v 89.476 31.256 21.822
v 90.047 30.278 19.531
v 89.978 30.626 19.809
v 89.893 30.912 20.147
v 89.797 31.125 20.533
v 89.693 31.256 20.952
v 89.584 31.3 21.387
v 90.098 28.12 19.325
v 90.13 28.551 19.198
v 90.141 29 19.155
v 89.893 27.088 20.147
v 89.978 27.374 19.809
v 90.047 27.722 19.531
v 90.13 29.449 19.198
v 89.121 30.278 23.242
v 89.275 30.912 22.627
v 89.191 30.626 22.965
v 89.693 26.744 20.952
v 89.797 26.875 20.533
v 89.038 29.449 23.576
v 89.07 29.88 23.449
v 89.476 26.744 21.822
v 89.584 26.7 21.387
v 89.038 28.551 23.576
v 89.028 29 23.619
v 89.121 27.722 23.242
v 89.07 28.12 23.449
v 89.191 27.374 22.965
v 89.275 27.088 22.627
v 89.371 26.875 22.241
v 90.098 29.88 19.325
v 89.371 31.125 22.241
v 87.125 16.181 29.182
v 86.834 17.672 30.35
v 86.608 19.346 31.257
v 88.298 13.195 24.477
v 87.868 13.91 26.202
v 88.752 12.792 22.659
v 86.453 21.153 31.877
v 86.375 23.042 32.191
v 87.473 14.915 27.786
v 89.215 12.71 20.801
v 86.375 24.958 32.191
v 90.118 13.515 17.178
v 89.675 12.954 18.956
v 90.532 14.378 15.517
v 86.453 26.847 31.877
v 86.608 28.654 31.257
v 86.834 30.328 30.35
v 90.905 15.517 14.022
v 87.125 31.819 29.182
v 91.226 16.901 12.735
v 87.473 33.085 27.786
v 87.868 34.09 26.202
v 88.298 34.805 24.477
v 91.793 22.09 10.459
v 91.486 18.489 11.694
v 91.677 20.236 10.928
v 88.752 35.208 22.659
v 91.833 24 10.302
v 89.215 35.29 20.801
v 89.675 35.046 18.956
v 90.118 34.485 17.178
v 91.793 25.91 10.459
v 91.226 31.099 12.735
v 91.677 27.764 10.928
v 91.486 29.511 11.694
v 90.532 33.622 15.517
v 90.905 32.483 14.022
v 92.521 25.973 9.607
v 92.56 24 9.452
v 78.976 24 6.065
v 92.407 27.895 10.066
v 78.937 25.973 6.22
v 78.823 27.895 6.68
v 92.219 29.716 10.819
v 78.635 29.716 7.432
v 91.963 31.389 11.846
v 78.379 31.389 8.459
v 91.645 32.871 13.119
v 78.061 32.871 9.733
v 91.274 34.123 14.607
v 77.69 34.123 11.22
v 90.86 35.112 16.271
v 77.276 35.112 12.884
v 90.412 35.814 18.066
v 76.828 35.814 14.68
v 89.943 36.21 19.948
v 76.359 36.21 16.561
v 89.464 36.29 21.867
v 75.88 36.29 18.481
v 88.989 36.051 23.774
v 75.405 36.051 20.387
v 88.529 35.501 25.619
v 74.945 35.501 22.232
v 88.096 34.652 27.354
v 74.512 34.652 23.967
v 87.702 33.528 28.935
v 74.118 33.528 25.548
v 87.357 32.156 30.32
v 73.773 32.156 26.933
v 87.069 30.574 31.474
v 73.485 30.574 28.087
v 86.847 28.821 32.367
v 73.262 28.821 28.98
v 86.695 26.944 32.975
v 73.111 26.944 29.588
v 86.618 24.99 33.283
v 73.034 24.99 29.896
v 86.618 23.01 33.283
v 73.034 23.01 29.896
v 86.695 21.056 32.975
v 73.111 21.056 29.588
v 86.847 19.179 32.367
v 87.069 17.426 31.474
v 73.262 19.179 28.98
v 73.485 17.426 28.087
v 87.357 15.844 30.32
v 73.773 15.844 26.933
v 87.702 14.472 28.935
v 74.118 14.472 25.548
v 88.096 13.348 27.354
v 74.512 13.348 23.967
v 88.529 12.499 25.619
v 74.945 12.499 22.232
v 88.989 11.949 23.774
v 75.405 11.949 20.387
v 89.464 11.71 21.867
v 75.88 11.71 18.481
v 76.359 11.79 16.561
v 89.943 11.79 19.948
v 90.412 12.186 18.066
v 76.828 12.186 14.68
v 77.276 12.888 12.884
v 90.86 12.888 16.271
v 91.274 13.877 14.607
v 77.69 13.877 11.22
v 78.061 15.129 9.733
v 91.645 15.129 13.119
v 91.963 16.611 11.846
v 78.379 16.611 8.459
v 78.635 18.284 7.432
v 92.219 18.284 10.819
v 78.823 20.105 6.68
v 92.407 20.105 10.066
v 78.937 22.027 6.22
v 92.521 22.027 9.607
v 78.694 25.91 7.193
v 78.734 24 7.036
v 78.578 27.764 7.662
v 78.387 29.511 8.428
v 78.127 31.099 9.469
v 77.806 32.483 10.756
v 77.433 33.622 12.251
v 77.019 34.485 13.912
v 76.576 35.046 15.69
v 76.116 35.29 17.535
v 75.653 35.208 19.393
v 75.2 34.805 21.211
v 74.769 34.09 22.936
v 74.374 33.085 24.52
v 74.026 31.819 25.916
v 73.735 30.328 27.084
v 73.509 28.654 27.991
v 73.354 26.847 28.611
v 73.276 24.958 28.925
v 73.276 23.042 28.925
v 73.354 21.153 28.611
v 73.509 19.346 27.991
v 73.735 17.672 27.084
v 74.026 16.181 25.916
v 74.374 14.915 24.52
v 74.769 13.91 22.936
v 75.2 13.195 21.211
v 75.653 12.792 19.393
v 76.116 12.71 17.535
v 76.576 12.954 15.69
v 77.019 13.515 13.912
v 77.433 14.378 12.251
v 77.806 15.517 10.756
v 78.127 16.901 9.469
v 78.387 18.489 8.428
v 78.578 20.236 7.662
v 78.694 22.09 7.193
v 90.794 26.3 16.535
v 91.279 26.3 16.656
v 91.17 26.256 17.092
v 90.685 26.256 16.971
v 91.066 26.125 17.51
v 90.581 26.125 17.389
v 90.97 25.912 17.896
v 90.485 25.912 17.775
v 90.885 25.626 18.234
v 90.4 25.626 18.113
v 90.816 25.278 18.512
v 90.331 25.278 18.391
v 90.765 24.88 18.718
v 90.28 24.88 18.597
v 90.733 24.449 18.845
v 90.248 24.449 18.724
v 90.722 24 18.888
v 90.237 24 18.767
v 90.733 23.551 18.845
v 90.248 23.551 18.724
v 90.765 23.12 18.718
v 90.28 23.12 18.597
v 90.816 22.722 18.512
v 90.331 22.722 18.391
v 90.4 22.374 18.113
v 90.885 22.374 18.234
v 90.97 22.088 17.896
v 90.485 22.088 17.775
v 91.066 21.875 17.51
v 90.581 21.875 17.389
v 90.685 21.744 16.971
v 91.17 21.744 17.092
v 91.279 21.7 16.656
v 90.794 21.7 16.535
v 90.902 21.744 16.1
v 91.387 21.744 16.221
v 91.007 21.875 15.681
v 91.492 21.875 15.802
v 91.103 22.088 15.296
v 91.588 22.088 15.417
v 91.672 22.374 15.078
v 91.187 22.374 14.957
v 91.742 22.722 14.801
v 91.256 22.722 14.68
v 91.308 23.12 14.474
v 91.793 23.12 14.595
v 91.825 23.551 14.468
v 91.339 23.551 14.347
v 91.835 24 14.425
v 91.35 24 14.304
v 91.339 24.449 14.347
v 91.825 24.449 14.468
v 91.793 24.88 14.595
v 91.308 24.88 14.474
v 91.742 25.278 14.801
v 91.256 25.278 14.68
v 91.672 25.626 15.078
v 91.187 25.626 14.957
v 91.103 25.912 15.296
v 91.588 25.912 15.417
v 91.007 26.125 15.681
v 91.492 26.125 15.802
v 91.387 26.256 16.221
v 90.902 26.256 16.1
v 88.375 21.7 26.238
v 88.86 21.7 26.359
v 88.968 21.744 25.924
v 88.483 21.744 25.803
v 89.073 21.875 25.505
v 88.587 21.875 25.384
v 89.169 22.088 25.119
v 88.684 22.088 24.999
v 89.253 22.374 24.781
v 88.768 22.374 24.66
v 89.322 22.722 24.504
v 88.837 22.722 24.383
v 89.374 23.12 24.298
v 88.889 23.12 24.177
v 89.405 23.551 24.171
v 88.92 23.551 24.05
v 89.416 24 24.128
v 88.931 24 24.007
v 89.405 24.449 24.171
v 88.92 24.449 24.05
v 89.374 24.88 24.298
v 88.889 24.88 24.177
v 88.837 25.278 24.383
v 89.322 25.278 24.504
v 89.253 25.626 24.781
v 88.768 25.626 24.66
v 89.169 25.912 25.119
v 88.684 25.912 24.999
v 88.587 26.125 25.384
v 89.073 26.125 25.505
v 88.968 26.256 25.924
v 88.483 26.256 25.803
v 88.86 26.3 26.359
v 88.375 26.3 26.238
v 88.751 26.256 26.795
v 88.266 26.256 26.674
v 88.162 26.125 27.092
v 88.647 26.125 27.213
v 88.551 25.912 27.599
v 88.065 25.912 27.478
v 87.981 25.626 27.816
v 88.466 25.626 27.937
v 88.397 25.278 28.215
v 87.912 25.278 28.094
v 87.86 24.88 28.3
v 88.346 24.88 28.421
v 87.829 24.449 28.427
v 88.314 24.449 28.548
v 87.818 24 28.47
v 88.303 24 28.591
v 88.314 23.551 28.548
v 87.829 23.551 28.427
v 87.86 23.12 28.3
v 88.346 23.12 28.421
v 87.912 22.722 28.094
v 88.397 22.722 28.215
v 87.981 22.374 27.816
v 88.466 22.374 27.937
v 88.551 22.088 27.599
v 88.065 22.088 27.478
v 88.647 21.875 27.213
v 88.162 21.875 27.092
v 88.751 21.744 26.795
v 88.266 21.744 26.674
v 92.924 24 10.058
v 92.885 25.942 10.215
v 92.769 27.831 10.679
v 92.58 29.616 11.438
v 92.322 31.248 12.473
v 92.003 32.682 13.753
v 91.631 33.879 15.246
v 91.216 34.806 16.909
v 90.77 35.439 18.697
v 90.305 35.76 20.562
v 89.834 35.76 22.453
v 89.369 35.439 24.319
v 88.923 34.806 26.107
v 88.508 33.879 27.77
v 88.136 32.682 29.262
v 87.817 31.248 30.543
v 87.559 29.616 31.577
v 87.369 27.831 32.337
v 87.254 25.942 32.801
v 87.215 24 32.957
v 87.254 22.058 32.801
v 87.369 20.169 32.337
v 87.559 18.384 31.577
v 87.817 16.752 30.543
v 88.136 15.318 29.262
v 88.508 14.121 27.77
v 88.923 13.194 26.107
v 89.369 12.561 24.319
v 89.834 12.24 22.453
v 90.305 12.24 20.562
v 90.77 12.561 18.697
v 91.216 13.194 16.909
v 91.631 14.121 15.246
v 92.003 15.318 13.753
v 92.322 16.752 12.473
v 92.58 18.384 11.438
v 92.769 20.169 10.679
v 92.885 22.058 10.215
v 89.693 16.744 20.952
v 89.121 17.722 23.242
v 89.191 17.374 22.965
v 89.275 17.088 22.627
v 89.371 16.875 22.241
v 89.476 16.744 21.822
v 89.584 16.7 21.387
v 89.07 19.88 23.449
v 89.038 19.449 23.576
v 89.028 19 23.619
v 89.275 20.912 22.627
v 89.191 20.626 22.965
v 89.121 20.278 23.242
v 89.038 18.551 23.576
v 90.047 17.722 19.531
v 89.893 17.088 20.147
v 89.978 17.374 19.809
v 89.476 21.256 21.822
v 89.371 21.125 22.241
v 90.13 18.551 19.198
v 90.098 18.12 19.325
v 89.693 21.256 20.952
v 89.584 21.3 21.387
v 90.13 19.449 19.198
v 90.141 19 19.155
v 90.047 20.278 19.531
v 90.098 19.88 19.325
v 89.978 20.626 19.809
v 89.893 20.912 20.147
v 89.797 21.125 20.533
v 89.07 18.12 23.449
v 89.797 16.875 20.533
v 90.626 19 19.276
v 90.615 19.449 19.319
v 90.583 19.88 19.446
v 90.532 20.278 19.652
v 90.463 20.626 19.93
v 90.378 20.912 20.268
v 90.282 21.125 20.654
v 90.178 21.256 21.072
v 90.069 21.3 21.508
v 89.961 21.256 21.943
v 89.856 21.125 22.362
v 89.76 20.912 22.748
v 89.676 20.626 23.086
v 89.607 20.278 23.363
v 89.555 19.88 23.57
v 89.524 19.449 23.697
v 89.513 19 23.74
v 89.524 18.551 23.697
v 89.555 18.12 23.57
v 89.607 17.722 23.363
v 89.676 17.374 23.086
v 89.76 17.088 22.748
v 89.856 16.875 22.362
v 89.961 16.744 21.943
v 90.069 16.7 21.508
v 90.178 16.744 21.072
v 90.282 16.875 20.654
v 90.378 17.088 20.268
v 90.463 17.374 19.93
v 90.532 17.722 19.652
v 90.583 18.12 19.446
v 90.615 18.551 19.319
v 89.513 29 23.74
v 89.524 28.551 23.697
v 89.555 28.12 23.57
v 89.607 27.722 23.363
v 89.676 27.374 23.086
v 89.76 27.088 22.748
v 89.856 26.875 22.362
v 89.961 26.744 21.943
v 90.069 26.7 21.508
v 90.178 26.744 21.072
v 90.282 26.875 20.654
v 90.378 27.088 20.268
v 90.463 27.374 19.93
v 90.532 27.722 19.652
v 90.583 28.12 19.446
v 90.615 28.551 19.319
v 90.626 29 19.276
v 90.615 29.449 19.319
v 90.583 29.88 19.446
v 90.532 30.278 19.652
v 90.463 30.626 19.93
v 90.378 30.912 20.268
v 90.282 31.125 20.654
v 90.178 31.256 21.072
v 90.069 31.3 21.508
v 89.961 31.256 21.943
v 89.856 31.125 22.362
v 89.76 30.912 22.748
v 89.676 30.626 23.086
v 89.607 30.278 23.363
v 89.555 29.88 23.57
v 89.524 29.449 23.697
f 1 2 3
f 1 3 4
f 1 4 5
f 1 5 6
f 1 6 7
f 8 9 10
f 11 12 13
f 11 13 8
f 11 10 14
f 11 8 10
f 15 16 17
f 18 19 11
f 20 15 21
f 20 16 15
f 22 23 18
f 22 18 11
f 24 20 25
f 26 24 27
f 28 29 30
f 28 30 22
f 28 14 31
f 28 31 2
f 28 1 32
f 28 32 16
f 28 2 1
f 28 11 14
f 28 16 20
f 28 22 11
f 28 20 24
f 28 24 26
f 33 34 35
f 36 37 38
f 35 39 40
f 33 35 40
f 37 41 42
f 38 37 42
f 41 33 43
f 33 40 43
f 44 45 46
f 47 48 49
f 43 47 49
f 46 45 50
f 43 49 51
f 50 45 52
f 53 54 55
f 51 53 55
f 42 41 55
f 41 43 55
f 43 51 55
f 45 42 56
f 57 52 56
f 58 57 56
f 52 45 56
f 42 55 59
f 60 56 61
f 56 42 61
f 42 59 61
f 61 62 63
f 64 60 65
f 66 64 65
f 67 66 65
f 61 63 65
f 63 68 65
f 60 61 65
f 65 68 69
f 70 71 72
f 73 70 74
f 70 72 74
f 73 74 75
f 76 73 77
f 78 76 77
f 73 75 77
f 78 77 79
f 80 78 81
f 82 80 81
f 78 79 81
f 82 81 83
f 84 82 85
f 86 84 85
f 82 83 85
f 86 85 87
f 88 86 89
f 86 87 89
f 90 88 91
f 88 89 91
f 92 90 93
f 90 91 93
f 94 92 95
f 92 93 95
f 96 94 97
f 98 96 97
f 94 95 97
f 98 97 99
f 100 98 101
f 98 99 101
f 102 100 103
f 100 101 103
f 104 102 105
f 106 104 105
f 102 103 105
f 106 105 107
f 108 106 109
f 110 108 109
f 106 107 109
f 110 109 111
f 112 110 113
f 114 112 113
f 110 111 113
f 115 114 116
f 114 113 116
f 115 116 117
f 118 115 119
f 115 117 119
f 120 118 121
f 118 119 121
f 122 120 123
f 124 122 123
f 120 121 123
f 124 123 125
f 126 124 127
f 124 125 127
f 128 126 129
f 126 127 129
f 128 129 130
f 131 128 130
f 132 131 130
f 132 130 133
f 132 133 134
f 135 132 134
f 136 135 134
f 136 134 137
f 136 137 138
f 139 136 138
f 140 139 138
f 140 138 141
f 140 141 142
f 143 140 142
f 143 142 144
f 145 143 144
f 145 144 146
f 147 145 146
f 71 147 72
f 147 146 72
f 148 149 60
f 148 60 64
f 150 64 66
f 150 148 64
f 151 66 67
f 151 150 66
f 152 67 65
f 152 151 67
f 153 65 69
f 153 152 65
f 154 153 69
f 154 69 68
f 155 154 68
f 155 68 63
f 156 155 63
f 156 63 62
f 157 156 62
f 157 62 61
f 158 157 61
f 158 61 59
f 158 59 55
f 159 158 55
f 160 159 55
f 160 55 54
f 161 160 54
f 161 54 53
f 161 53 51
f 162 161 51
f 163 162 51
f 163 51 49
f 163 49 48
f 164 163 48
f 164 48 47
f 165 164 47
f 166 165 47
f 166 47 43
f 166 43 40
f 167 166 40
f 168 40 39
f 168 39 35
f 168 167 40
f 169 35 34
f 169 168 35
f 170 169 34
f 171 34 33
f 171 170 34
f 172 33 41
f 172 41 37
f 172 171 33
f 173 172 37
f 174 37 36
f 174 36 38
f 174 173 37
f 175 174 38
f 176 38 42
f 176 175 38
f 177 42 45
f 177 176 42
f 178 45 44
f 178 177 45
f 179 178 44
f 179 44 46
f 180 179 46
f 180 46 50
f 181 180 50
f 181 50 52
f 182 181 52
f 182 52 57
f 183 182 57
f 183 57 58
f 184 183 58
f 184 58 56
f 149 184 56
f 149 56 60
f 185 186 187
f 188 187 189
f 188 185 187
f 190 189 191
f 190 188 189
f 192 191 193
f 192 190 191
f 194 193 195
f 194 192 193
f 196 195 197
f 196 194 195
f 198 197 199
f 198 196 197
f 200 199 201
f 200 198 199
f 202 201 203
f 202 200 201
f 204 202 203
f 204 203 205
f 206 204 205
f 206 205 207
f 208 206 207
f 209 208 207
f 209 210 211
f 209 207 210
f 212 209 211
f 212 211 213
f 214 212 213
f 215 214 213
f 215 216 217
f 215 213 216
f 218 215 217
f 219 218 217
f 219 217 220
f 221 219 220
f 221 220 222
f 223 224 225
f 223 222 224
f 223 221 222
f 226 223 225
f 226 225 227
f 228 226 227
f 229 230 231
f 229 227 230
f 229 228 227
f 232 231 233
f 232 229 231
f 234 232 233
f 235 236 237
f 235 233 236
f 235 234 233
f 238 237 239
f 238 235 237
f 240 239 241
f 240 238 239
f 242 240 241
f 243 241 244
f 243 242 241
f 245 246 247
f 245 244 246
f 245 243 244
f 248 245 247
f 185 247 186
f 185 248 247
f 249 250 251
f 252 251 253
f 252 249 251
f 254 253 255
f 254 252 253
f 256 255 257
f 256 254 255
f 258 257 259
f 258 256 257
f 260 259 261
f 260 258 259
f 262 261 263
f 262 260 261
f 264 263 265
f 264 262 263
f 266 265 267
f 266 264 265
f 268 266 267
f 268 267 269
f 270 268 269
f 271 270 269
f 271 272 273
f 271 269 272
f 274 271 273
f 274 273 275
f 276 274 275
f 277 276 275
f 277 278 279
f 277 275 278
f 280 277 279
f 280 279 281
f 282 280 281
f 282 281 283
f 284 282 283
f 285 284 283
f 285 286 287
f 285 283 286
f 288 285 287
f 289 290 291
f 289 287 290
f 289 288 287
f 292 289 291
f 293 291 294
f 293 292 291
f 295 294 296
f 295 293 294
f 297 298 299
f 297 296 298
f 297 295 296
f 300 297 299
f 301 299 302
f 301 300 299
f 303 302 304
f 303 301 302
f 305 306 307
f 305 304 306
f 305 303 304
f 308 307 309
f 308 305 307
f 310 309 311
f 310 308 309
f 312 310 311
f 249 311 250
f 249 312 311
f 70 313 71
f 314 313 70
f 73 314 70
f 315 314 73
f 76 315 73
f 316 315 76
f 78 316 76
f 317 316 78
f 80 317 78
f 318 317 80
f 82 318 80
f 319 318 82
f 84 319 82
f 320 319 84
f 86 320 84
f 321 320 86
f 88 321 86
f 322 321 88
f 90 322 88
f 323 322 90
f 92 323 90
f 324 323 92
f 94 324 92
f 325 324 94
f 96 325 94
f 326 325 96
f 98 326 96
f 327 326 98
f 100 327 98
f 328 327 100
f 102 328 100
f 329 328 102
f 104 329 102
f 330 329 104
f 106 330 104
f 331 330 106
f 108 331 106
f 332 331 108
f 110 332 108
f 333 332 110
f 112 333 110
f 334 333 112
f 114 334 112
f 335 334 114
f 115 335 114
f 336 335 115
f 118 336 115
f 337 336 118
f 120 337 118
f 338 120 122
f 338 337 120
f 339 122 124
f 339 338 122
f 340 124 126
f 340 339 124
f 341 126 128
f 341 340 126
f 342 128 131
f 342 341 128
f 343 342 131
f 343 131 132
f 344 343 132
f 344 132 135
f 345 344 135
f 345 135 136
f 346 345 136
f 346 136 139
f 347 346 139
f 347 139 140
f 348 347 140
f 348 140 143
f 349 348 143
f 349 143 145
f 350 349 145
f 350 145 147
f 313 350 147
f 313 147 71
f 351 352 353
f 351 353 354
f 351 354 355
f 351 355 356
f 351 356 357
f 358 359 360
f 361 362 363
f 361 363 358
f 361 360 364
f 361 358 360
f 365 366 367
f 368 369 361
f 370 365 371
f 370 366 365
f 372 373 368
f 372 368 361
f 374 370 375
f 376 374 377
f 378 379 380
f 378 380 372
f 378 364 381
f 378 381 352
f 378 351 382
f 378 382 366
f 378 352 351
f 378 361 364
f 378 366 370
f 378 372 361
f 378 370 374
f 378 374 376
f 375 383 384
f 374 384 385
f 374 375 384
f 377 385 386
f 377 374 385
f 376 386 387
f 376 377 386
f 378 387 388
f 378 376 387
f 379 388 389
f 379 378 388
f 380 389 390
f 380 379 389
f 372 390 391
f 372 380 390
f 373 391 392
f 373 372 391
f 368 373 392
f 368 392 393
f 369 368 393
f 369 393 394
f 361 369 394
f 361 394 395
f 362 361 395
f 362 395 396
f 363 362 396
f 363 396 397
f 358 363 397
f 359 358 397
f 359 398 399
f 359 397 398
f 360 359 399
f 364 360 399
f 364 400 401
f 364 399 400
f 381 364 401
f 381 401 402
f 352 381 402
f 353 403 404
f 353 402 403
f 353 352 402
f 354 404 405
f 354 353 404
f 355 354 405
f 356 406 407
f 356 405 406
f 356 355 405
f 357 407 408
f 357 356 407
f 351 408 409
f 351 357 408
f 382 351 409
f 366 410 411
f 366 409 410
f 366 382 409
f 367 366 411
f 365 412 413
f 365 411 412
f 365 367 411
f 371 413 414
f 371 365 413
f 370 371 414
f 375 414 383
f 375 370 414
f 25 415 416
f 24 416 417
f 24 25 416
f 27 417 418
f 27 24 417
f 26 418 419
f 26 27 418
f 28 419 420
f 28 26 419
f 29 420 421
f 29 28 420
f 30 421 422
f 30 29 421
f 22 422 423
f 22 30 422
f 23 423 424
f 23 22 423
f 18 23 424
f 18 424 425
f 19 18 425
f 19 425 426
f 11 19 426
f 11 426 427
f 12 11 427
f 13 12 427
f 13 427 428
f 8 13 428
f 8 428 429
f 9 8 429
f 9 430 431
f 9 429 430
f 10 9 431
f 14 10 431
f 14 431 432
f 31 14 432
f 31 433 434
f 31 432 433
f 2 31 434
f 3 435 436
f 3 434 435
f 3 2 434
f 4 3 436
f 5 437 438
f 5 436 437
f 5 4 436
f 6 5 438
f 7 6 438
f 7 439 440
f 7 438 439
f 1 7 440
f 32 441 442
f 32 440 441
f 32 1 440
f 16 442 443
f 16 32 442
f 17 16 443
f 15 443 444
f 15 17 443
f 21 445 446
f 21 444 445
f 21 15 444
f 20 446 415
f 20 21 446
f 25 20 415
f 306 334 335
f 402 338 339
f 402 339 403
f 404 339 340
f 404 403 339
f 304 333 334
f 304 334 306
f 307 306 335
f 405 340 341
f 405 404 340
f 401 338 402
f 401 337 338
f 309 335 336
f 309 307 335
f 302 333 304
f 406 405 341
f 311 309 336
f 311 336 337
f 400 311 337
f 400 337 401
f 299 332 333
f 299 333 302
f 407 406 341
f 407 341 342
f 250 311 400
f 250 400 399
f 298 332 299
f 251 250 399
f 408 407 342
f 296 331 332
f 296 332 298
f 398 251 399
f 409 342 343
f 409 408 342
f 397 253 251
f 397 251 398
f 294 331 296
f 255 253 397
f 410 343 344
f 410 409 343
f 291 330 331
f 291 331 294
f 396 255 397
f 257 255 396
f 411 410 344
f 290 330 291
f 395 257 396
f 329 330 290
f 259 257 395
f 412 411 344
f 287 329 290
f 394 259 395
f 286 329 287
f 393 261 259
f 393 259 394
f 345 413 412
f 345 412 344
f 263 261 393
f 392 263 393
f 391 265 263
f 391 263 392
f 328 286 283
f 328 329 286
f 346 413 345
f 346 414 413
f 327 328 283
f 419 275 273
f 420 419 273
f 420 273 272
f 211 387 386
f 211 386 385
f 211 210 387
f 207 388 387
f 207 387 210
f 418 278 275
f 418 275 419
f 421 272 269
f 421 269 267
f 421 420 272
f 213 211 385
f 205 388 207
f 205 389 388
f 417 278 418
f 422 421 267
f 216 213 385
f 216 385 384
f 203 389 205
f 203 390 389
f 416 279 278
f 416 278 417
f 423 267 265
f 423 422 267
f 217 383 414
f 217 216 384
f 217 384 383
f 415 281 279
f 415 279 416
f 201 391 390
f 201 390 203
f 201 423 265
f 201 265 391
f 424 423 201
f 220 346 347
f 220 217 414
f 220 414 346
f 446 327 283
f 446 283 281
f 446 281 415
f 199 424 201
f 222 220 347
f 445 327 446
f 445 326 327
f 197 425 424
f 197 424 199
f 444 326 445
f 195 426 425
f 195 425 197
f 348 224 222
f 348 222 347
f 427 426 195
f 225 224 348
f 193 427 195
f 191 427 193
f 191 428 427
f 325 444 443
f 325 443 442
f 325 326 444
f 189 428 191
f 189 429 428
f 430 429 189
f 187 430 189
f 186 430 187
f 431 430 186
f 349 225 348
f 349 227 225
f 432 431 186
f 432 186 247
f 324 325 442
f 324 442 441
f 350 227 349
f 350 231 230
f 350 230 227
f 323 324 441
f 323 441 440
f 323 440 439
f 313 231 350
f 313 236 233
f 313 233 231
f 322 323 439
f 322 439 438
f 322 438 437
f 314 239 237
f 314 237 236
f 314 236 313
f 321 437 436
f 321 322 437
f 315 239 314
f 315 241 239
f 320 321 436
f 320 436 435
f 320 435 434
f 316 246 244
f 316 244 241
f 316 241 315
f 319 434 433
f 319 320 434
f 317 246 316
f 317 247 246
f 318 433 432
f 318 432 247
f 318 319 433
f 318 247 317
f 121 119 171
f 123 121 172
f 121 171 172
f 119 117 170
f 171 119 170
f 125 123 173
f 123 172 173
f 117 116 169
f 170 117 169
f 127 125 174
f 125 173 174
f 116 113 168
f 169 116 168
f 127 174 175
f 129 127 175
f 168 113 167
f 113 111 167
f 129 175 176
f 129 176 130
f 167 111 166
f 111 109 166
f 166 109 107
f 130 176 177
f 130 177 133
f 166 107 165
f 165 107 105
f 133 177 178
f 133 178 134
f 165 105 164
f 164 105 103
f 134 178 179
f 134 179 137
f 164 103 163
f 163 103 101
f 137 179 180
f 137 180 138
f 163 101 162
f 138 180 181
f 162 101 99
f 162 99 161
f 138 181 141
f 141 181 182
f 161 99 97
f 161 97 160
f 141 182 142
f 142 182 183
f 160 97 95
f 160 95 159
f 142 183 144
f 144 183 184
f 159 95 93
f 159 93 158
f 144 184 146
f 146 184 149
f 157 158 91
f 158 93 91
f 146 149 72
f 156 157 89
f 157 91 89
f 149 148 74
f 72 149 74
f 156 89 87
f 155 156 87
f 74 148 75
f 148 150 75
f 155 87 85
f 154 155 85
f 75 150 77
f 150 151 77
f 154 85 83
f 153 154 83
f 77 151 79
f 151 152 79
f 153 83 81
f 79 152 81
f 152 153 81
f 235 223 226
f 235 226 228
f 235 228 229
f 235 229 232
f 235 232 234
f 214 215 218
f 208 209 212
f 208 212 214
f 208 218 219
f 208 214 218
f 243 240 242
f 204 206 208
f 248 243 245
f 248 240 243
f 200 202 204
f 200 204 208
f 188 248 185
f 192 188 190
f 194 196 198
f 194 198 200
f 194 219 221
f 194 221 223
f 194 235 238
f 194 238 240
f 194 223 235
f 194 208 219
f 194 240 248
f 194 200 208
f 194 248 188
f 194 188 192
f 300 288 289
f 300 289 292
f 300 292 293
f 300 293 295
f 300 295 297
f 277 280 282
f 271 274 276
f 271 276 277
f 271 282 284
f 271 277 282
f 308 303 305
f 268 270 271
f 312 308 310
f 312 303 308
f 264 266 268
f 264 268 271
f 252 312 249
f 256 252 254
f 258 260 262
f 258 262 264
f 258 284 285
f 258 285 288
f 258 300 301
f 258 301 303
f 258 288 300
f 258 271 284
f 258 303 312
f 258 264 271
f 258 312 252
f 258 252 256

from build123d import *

# Parameters (mm, degrees)
CYLINDER005_R            = 11.3
CYLINDER005_DEPTH        = 14.5
CYLINDER004_R            = 2.3
CYLINDER004_DEPTH        = 14.5
ARRAY_COUNT              = 4
CYLINDER003_R            = 8.3
CYLINDER003_DEPTH        = 14.5
CYLINDER002_R            = 12.3
CYLINDER002_DEPTH        = 14.5
CHAMFER_SIZE             = 0.5
CLONE001_PLACEMENT_ANGLE = 76


with BuildPart() as cylinder005:
    # Cylinder005 → Cylinder005 (new body)
    with BuildSketch(Plane.XY.offset(-1)):
        Circle(CYLINDER005_R)
    extrude(amount=CYLINDER005_DEPTH)


with BuildPart() as array:
    # Cylinder004 → Cylinder004 (new body)
    with BuildSketch(Plane(origin=(0, -5, 14), x_dir=(1, 0, 0), z_dir=(0, 0, 1))):
        Circle(CYLINDER004_R)
    extrude(amount=CYLINDER004_DEPTH)

    # Array: Array ×4 about axis
    array_axis = Axis((0, 0, 0), (0, 0, 1))


with BuildPart() as array_1:
    add(array.part)
    for i in range(1, ARRAY_COUNT):
        add(array.part.rotate(array_axis, i * 360 / ARRAY_COUNT))


with BuildPart() as cylinder003:
    # Cylinder003 → Cylinder003 (new body)
    with BuildSketch(Plane.XY.offset(14.5)):
        Circle(CYLINDER003_R)
    extrude(amount=CYLINDER003_DEPTH)


with BuildPart() as cup_compound_clone:
    # Cylinder002 → Cylinder002 (new body)
    with BuildSketch(Plane.XY):
        Circle(CYLINDER002_R)
    extrude(amount=CYLINDER002_DEPTH)

    # Cut002: cut Cylinder003
    add(cylinder003.part, mode=Mode.SUBTRACT)

    # Cut003: cut Array
    add(array_1.part, mode=Mode.SUBTRACT)

    # Cut004: cut Cylinder005
    add(cylinder005.part, mode=Mode.SUBTRACT)

    # Chamfer
    chamfer_edges = [cup_compound_clone.edges().sort_by_distance(p)[0] for p in [
        (-12.3, 0, 14.5),
    ]]
    chamfer(chamfer_edges, length=CHAMFER_SIZE)


with BuildPart() as cup_compound_clone_1:
    # Clone001 placement: moved
    add(cup_compound_clone.part.moved(Location((76, 24, 18))).rotate(Axis((76, 24, 18), (0, 1, 0)), CLONE001_PLACEMENT_ANGLE))


solid = cup_compound_clone_1.part
